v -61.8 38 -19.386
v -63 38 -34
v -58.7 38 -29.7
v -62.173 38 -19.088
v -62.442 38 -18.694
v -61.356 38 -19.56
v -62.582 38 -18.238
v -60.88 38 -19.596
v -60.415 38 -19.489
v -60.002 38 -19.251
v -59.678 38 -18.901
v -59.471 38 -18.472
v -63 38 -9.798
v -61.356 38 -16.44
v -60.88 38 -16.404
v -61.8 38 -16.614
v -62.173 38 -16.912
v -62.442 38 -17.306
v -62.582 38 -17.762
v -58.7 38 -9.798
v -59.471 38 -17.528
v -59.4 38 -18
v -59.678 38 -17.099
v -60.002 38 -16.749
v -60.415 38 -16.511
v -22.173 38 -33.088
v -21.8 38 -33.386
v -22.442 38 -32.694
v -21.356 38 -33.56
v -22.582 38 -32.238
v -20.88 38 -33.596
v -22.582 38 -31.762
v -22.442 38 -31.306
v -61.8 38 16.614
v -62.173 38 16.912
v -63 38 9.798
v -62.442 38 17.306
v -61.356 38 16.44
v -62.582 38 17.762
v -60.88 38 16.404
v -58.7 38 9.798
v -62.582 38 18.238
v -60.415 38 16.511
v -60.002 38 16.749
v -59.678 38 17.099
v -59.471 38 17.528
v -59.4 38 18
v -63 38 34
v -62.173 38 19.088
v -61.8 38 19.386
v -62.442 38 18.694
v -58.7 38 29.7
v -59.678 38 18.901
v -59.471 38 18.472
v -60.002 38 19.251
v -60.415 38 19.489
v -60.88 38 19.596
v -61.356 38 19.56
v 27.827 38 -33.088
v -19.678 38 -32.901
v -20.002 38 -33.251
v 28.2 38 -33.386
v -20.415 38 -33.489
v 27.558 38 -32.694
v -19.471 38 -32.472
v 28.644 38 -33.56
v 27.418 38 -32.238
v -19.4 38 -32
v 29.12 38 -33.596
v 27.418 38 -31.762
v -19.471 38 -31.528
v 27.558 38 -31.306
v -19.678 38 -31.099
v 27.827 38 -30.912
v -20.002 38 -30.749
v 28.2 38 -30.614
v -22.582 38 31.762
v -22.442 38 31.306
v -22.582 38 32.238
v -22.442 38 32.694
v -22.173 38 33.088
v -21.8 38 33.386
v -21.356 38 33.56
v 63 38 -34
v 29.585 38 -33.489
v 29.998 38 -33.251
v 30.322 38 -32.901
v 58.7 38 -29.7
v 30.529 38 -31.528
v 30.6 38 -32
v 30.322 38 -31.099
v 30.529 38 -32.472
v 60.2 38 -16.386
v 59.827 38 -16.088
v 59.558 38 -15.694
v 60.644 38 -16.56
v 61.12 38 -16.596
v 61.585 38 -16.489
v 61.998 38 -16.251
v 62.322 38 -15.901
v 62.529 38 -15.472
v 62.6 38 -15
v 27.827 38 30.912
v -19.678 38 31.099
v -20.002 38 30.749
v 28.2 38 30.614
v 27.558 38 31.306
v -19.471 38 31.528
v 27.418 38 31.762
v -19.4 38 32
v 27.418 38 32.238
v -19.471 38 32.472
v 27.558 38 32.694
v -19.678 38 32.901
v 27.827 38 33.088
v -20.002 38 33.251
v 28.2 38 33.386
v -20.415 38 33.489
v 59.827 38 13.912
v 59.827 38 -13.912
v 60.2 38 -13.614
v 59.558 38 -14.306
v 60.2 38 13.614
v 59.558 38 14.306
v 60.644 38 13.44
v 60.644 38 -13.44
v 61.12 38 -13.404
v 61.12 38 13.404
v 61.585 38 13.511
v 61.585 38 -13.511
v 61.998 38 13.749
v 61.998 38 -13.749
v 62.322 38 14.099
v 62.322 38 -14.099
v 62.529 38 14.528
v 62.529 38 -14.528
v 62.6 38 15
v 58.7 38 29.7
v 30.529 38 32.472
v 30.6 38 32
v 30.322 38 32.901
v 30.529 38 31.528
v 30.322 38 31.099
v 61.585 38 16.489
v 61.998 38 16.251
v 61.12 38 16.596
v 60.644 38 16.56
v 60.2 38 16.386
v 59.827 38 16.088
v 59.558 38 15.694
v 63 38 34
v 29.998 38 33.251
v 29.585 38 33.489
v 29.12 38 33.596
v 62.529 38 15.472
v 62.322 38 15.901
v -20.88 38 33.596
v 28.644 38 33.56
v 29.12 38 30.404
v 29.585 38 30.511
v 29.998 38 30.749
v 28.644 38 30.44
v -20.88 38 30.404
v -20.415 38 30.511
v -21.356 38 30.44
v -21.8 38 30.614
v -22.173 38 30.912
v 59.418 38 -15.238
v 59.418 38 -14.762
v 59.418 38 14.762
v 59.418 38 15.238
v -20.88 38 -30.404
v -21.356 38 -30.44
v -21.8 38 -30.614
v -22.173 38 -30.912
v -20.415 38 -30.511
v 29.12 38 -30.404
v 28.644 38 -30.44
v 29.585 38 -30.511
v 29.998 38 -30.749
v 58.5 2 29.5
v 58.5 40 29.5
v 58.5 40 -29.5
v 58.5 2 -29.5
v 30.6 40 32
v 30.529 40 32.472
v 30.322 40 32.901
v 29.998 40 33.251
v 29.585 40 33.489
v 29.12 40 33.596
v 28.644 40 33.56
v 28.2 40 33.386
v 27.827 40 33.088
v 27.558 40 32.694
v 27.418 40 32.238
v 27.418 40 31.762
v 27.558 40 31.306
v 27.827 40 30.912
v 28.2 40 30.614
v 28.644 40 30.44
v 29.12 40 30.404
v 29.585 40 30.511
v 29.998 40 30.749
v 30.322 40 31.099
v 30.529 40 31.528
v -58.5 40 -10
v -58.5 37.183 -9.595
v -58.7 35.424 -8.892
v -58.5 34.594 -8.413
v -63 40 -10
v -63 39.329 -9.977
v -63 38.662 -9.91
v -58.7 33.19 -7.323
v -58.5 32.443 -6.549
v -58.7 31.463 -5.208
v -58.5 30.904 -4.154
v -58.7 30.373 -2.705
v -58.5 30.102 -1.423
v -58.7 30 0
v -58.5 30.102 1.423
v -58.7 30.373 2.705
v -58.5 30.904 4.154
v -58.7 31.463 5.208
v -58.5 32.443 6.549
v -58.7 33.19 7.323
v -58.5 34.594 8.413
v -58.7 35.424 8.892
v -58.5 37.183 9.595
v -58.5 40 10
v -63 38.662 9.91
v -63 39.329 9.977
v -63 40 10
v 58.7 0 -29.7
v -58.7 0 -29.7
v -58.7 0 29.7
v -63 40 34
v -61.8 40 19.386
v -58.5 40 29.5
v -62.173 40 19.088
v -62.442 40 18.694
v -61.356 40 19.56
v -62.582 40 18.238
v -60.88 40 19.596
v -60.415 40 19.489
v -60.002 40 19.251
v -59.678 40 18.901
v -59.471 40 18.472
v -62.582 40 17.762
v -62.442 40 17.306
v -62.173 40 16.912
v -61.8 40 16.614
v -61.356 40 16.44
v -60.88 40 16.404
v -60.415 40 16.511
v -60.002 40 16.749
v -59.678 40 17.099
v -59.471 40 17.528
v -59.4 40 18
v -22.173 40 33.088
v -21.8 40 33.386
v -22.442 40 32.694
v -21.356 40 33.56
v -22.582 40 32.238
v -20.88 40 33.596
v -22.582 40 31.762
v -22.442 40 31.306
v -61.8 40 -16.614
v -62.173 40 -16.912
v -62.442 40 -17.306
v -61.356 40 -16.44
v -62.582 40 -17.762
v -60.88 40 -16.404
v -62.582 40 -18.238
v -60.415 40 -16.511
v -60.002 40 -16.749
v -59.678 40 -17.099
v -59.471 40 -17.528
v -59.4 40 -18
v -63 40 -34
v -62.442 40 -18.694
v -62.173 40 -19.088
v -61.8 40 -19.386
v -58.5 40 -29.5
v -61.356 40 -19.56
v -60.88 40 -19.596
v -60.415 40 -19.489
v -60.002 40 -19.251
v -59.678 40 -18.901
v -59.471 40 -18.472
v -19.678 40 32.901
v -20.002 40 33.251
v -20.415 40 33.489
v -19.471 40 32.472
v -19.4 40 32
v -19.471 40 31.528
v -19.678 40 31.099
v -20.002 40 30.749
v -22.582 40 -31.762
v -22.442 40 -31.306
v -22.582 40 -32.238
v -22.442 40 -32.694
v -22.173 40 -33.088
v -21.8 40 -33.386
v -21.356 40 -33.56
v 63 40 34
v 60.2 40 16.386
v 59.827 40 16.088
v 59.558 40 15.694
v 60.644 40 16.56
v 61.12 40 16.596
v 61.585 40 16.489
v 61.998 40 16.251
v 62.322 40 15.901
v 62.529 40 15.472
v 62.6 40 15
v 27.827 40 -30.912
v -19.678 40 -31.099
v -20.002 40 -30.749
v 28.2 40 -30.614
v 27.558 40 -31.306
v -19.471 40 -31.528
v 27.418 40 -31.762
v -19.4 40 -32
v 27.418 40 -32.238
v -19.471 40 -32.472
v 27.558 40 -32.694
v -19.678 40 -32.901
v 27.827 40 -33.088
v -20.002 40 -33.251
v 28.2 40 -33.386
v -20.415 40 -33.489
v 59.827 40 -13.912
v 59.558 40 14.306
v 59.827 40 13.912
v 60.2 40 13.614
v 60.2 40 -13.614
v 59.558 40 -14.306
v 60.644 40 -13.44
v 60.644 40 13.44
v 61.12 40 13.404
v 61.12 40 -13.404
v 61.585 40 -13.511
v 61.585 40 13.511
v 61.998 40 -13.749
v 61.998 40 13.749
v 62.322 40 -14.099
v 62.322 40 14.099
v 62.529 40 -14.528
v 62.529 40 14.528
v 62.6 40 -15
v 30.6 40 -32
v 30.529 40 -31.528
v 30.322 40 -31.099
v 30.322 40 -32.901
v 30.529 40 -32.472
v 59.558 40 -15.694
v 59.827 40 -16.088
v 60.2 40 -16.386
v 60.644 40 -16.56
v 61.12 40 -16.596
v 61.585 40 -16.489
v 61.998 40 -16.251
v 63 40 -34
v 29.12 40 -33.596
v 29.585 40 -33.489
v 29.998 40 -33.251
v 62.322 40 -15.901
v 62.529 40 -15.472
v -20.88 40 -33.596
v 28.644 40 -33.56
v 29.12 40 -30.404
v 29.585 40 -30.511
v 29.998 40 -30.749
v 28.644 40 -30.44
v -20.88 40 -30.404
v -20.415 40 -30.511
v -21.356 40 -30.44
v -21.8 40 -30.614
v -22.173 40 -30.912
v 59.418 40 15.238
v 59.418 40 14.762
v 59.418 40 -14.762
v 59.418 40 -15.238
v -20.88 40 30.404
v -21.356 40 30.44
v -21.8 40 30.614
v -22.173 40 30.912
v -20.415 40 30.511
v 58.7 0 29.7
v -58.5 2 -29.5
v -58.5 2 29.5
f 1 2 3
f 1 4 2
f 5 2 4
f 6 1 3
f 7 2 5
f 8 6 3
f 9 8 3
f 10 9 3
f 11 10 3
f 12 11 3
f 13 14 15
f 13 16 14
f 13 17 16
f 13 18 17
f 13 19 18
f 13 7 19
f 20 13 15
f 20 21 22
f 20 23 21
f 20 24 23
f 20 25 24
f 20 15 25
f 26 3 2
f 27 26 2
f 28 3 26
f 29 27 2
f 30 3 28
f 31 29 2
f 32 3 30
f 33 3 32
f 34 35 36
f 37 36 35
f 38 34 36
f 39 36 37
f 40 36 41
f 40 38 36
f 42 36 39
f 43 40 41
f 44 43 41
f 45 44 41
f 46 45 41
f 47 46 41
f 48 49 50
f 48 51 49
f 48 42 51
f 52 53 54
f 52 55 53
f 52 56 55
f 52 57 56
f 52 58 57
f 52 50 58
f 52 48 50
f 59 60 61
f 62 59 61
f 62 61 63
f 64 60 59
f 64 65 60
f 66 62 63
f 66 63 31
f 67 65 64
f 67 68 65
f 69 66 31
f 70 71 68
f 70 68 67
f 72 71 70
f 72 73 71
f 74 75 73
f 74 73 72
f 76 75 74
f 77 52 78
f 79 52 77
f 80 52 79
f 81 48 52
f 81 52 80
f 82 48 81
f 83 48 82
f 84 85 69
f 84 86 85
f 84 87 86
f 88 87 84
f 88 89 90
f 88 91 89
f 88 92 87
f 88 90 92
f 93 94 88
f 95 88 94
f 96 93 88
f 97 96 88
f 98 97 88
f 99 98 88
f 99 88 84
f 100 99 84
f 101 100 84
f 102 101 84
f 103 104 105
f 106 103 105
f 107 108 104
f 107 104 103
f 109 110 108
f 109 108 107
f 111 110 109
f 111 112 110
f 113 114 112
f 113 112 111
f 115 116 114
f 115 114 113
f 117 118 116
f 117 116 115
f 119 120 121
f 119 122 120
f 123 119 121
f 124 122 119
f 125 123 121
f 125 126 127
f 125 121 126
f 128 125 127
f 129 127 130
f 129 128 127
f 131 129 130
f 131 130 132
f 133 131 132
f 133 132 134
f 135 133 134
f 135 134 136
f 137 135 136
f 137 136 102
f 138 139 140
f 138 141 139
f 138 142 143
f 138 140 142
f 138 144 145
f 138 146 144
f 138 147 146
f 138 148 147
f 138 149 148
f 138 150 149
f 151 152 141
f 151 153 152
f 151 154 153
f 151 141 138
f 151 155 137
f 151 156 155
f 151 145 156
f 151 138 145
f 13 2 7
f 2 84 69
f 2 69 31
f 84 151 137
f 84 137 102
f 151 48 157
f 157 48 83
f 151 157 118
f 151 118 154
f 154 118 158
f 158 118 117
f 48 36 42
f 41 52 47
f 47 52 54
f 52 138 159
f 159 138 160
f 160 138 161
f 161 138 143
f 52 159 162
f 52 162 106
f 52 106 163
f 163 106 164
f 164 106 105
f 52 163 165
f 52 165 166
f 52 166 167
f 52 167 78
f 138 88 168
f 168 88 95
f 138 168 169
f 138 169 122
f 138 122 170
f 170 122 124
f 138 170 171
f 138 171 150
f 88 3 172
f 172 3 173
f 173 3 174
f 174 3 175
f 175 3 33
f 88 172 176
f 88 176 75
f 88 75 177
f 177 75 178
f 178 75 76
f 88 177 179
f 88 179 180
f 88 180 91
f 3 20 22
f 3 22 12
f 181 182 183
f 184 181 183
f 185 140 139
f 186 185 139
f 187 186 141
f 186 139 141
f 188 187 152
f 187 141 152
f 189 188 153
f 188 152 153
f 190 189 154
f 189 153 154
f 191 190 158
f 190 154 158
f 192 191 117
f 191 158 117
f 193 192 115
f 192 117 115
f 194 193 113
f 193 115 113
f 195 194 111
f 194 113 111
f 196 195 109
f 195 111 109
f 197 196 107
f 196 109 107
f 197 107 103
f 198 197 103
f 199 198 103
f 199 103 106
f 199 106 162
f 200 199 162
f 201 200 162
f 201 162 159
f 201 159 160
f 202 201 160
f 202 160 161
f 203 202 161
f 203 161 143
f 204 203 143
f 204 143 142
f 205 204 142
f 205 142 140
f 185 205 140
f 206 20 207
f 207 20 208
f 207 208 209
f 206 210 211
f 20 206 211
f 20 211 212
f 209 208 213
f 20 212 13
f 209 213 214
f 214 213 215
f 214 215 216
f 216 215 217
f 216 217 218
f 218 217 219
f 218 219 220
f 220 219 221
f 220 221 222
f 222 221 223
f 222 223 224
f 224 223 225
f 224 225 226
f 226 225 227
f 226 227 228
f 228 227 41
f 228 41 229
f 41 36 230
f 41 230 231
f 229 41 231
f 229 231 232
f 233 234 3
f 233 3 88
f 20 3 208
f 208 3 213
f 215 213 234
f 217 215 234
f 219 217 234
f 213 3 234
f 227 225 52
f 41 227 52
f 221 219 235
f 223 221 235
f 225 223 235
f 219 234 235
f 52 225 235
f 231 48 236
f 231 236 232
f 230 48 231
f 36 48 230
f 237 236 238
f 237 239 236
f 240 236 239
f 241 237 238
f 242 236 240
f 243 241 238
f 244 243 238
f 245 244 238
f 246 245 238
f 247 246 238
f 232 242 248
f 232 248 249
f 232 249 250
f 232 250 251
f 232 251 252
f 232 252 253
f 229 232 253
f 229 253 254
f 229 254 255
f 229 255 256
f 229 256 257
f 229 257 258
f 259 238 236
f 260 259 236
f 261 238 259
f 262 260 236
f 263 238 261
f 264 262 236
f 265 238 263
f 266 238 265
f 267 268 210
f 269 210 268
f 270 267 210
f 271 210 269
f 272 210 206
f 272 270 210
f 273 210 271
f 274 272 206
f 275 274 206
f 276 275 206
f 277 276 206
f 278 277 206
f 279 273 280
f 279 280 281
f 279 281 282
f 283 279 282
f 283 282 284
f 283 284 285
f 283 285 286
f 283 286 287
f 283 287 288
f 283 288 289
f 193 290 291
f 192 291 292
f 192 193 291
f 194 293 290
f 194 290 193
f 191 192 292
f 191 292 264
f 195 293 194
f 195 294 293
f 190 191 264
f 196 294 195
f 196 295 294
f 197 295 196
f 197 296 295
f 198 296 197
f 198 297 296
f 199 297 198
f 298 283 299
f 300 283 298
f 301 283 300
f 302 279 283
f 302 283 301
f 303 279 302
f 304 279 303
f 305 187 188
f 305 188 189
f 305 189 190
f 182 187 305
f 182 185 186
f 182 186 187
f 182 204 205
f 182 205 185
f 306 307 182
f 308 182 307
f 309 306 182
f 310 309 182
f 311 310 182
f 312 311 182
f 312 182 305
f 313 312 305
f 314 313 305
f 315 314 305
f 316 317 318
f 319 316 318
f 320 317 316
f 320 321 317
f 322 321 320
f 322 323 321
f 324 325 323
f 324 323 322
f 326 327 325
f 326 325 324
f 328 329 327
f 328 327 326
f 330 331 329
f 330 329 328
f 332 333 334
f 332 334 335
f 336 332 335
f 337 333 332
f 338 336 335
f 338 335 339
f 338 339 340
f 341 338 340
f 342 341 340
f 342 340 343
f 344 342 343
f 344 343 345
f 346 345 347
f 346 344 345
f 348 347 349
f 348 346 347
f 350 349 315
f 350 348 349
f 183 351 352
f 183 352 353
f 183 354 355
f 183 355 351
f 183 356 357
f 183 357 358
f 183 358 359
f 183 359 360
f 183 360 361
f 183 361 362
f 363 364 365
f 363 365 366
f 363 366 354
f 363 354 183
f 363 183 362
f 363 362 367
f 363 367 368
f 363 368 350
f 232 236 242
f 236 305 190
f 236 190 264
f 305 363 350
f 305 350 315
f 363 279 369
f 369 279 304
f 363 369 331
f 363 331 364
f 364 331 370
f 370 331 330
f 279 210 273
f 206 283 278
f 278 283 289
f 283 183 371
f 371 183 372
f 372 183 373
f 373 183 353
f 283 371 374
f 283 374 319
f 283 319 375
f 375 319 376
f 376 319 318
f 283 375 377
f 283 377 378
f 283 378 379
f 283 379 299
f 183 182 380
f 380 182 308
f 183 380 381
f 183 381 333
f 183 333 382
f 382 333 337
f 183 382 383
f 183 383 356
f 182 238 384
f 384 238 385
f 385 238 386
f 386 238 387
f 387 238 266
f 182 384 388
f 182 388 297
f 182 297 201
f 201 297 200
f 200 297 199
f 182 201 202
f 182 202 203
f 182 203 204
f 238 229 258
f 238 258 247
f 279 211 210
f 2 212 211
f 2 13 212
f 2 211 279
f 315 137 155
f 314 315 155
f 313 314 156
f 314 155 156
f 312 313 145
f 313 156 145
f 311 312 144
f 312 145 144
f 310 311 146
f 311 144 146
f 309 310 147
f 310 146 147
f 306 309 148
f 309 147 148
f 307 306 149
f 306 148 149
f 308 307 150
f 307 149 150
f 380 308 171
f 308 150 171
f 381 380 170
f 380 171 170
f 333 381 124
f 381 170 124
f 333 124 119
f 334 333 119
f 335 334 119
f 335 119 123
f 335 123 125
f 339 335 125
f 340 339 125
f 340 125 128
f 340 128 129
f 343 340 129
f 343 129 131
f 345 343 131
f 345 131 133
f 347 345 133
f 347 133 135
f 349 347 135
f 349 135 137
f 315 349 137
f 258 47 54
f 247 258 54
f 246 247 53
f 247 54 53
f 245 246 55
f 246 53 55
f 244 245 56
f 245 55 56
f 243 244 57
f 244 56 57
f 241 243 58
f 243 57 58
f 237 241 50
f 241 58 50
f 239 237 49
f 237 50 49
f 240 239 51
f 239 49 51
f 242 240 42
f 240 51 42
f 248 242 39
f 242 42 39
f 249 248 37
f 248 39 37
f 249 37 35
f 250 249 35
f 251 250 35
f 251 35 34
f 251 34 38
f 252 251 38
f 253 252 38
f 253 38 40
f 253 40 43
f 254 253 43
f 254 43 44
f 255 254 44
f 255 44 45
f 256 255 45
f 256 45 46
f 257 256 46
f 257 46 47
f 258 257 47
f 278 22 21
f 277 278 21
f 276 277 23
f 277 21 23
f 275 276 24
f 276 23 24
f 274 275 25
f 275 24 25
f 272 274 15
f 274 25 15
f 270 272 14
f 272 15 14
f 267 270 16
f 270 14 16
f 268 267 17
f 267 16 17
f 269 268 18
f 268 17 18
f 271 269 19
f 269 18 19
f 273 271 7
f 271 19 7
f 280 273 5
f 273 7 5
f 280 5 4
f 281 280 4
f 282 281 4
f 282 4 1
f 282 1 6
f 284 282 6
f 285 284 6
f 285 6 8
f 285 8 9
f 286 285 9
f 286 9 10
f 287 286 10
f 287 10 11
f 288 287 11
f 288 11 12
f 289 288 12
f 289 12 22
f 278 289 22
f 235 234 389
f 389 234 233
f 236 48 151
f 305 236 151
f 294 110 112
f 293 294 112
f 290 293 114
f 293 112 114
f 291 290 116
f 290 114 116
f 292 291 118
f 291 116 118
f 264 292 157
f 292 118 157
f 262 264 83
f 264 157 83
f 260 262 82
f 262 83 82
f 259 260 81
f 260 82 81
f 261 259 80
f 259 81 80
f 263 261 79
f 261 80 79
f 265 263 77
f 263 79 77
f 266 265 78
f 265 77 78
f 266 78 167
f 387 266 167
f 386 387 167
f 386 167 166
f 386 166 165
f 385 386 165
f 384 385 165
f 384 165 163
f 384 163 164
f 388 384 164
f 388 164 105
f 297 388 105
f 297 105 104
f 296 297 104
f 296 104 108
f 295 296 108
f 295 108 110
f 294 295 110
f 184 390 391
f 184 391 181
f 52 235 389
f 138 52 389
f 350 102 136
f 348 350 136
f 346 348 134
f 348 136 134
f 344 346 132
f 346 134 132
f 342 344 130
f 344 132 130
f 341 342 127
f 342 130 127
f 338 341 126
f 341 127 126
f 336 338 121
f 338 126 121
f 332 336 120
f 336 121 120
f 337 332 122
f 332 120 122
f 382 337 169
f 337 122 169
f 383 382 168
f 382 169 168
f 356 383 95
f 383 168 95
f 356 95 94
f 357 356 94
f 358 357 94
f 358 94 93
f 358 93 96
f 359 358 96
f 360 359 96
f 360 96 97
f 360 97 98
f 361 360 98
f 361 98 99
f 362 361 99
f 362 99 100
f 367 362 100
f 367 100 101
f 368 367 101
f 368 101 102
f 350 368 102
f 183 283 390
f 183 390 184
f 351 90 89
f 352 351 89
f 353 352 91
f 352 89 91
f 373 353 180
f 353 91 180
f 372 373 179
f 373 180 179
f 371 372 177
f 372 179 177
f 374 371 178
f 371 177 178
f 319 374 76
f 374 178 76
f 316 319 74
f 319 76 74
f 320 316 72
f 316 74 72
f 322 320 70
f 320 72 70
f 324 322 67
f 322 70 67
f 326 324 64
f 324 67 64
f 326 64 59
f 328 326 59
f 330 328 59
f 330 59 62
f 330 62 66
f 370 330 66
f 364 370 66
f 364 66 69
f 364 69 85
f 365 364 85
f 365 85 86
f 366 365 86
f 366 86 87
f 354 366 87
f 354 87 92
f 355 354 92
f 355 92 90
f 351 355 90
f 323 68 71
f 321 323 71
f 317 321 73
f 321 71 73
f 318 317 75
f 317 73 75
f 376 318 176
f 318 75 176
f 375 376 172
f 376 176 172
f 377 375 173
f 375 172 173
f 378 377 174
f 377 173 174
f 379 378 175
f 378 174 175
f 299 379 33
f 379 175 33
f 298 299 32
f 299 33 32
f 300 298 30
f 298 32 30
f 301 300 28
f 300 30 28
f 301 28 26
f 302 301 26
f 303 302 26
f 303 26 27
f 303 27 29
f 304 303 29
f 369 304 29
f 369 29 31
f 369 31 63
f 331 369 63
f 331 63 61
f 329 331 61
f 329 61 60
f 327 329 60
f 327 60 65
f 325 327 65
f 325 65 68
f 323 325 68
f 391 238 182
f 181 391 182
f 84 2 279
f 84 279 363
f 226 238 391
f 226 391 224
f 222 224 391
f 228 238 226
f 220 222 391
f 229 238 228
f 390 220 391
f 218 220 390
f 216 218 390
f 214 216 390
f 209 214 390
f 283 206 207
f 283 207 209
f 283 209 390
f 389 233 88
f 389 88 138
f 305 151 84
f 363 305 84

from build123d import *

# Parameters (mm, degrees)
SKETCH1_W           = 126
SKETCH1_H           = 68
BOSS_EXTRUDE1_DEPTH = 40
SKETCH2_W           = 117
SKETCH2_H           = 59
CUT_EXTRUDE1_DEPTH  = 38
SKETCH3_W           = 126
SKETCH3_H           = 68
SKETCH3_W_2         = 117.4
SKETCH3_H_2         = 59.4
CUT_EXTRUDE2_DEPTH  = 38
SKETCH4_R           = 10
CUT_EXTRUDE3_DEPTH  = 38
SKETCH6_R           = 1.6
CUT_EXTRUDE4_DEPTH  = 41


with BuildPart() as part:
    # Sketch1 → Boss-Extrude1 (new body)
    with BuildSketch(Plane(origin=(0, 0, 0), x_dir=(1, 0, 0), z_dir=(0, 1, 0))):
        Rectangle(SKETCH1_W, SKETCH1_H)
    extrude(amount=BOSS_EXTRUDE1_DEPTH)

    # Sketch2 → Cut-Extrude1 (cut)
    with BuildSketch(Plane(origin=(0, 40, 0), x_dir=(1, 0, 0), z_dir=(0, 1, 0))):
        Rectangle(SKETCH2_W, SKETCH2_H)
    extrude(amount=-CUT_EXTRUDE1_DEPTH, mode=Mode.SUBTRACT)

    # Sketch3 → Cut-Extrude2 (cut)
    with BuildSketch(Plane.XZ):
        Rectangle(SKETCH3_W, SKETCH3_H)
        Rectangle(SKETCH3_W_2, SKETCH3_H_2, mode=Mode.SUBTRACT)
    extrude(amount=-CUT_EXTRUDE2_DEPTH, mode=Mode.SUBTRACT)

    # Sketch4 → Cut-Extrude3 (cut)
    with BuildSketch(Plane.ZY.offset(63)):
        with Locations((0, 40)):
            Circle(SKETCH4_R)
    extrude(amount=-CUT_EXTRUDE3_DEPTH, mode=Mode.SUBTRACT)

    # Sketch6 → Cut-Extrude4 (cut, through all)
    with BuildSketch(Plane.XZ):
        with Locations((61, 15)):
            Circle(SKETCH6_R)
        with Locations((-61, 18)):
            Circle(SKETCH6_R)
        with Locations((-61, -18)):
            Circle(SKETCH6_R)
        with Locations((61, -15)):
            Circle(SKETCH6_R)
        with Locations((-21, 32)):
            Circle(SKETCH6_R)
        with Locations((-21, -32)):
            Circle(SKETCH6_R)
        with Locations((29, 32)):
            Circle(SKETCH6_R)
        with Locations((29, -32)):
            Circle(SKETCH6_R)
    extrude(amount=-CUT_EXTRUDE4_DEPTH, mode=Mode.SUBTRACT)


solid = part.part
